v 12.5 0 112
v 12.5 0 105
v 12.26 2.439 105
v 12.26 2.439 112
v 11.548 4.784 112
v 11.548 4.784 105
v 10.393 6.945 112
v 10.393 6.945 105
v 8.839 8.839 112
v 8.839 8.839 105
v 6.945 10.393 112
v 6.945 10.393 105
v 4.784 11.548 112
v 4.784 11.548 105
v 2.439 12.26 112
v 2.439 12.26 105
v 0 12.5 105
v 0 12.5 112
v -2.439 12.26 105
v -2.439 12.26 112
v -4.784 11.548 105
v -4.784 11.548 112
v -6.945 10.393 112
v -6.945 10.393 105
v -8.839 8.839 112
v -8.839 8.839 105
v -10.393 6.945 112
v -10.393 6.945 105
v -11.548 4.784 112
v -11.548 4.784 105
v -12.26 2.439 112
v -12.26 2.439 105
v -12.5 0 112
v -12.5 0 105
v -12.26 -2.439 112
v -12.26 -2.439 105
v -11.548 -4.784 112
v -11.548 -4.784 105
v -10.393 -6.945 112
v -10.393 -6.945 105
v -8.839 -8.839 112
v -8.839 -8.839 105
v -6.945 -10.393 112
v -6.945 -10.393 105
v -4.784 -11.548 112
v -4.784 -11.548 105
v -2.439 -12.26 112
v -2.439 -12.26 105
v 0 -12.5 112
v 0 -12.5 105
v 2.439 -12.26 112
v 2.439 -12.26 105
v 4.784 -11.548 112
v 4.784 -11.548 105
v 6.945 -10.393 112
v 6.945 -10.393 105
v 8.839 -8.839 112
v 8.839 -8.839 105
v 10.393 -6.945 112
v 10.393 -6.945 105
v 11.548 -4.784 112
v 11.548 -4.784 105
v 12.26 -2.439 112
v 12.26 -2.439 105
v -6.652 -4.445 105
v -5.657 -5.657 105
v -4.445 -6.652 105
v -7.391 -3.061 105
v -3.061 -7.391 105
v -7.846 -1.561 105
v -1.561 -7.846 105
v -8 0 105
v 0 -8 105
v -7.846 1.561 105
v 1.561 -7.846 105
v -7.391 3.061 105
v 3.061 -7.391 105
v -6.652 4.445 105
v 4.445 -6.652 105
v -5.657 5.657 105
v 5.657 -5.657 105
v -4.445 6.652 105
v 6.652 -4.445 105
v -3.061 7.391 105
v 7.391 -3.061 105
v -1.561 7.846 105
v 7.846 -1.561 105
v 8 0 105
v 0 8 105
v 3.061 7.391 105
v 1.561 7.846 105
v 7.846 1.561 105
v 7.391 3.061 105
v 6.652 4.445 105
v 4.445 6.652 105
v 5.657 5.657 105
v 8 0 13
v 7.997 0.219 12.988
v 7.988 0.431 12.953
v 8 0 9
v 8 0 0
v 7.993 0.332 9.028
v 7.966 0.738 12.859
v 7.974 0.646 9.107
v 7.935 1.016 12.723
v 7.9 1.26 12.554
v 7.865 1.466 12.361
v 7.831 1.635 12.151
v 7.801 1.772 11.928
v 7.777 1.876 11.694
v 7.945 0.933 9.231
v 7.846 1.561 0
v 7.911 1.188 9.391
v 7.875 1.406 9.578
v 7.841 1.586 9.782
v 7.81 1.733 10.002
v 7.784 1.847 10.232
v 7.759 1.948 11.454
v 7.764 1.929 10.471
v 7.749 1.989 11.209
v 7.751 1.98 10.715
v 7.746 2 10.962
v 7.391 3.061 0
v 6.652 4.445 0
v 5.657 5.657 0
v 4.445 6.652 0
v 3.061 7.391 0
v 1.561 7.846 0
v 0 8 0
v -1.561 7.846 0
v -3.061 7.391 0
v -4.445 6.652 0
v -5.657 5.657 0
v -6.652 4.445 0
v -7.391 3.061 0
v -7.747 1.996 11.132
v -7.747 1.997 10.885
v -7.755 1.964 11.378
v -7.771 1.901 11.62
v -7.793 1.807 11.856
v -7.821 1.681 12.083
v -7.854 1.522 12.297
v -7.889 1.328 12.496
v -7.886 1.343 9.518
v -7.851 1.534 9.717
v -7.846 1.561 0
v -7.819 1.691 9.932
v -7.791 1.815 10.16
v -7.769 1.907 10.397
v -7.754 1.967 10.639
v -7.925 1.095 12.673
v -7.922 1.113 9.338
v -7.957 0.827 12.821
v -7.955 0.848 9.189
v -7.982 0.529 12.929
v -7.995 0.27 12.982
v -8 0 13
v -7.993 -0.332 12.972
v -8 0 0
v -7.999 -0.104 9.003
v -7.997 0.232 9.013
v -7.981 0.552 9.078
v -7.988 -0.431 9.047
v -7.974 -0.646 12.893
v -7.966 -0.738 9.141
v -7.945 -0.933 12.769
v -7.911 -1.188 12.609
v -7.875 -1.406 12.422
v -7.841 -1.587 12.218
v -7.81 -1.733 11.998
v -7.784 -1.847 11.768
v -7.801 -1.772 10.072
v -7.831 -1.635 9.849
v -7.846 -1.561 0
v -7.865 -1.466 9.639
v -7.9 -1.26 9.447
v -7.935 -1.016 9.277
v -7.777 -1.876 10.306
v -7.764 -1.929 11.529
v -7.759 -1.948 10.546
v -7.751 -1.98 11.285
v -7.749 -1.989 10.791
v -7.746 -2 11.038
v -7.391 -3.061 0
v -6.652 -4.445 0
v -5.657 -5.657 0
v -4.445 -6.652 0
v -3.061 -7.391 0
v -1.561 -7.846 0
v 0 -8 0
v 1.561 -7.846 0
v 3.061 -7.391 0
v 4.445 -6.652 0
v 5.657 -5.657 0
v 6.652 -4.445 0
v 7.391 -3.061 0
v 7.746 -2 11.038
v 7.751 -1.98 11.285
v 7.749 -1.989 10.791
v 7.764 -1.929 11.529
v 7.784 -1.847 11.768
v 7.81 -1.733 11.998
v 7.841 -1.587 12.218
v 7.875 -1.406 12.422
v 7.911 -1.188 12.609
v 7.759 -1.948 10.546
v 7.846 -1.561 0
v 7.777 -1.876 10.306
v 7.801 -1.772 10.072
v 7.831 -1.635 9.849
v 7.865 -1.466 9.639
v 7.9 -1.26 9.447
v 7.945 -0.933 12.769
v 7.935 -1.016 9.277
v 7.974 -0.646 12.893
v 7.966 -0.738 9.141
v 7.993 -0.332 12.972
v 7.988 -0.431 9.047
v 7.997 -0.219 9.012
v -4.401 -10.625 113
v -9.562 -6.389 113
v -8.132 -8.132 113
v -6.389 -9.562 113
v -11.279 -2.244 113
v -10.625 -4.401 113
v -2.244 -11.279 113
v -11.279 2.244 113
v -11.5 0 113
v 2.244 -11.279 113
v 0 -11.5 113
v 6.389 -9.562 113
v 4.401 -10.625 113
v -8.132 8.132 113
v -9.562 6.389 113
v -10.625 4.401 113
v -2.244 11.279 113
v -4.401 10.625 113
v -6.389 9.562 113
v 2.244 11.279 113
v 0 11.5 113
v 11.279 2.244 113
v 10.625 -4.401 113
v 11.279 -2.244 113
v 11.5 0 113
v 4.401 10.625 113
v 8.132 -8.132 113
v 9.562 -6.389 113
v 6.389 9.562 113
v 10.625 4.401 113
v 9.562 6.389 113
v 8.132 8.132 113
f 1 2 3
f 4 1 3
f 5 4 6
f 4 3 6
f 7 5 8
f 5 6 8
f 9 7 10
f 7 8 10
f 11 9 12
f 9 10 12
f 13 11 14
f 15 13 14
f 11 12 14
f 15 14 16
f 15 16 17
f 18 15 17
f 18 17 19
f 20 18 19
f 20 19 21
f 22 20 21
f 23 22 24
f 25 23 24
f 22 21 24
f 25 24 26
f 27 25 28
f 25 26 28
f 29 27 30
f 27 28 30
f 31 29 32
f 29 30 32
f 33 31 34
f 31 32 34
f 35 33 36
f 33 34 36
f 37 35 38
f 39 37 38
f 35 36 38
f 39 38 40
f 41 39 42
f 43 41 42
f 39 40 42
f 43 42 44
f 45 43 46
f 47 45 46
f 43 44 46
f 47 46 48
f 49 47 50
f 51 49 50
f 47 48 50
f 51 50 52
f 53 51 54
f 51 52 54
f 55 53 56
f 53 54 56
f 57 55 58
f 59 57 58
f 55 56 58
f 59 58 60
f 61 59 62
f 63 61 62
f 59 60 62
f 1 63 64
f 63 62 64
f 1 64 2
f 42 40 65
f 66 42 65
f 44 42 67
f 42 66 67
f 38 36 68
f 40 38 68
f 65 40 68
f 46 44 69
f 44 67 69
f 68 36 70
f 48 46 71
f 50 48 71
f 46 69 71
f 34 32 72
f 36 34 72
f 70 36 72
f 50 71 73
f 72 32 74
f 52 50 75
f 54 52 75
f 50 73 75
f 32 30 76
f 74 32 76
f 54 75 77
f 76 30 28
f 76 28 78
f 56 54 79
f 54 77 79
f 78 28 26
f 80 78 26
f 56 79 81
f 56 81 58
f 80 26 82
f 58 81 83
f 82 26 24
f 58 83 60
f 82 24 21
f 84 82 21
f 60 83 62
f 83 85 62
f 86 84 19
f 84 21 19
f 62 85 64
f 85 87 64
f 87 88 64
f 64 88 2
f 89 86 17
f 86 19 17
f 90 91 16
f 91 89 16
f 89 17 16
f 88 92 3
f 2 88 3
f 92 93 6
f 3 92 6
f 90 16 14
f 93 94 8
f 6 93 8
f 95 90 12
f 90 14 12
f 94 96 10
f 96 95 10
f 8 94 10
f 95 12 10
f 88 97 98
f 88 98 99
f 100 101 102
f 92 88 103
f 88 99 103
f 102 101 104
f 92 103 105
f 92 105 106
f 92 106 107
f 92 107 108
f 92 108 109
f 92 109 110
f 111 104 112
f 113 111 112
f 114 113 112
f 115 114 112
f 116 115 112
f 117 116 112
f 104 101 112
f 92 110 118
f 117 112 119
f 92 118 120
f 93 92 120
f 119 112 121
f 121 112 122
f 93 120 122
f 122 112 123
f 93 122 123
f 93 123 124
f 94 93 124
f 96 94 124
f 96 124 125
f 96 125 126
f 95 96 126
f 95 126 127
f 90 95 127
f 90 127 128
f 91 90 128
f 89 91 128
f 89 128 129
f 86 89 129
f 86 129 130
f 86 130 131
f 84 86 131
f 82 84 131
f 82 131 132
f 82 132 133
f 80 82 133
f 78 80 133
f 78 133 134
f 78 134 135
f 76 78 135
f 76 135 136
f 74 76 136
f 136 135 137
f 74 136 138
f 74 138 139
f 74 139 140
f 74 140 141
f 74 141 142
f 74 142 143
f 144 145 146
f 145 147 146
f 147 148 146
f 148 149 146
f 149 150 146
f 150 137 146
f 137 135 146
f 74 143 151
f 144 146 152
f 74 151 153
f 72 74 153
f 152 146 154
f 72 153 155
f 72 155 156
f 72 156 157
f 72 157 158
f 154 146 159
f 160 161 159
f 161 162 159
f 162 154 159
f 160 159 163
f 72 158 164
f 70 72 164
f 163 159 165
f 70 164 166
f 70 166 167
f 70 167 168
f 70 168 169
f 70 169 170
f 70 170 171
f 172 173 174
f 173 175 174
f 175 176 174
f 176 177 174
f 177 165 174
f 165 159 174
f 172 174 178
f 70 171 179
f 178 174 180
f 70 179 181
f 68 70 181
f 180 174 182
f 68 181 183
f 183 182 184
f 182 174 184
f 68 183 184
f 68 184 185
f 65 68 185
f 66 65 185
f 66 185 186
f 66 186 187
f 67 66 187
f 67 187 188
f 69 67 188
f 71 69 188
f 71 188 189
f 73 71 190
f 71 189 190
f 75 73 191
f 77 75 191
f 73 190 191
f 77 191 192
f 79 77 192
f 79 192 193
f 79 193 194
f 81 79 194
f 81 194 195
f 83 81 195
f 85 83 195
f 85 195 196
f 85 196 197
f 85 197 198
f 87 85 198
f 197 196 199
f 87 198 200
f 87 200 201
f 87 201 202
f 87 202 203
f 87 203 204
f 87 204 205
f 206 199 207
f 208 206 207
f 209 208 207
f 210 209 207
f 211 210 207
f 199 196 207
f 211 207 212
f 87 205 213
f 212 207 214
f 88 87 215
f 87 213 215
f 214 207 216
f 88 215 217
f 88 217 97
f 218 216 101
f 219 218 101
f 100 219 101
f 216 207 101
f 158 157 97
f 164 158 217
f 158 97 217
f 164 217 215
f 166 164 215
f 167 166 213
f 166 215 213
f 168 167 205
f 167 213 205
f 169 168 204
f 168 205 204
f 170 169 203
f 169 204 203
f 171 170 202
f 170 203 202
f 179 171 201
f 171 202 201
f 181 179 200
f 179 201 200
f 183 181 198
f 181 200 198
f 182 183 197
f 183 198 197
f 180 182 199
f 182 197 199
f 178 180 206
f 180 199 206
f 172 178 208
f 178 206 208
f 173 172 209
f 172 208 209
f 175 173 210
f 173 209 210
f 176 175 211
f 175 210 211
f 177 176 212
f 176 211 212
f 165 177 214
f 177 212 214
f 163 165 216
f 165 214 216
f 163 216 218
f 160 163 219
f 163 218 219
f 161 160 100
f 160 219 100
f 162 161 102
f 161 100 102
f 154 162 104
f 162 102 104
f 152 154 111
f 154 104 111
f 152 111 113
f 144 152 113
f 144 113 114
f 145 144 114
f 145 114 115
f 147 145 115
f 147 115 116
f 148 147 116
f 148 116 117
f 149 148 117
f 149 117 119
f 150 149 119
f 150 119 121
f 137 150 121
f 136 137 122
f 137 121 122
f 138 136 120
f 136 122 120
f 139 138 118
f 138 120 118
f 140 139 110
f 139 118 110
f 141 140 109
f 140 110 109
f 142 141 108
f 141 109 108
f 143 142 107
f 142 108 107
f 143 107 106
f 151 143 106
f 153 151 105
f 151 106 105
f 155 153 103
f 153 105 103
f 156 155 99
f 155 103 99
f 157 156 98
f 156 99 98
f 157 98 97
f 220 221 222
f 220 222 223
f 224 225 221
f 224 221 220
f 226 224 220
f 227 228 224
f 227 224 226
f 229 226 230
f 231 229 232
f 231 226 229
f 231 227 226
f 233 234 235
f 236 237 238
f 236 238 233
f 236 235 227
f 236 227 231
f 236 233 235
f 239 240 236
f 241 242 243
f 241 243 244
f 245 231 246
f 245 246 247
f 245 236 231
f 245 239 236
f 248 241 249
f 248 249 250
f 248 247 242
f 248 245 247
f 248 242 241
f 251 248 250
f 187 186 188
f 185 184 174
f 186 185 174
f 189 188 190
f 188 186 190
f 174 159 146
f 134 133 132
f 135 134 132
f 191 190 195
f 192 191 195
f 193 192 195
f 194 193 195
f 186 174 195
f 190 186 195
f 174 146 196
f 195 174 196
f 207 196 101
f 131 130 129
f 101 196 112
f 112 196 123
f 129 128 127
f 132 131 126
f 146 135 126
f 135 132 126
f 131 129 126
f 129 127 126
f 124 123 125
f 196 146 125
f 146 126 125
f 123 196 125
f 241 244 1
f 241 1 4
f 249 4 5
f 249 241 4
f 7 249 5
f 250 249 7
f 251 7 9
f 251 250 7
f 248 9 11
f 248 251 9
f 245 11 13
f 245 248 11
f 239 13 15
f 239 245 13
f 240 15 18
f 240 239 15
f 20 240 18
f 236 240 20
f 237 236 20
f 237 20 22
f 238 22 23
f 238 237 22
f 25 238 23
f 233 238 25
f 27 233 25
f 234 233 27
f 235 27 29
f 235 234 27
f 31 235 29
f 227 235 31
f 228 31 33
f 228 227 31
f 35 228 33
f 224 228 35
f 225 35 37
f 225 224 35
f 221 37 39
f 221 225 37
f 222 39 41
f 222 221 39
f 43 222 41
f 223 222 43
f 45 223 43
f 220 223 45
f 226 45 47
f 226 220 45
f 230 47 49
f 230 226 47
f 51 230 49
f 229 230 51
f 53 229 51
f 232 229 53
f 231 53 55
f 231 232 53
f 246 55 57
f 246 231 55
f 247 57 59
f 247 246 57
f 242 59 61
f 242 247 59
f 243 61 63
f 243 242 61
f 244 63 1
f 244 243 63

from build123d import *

# Parameters (mm, degrees)
SKETCH1_R           = 8
BOSS_EXTRUDE1_DEPTH = 105
SKETCH2_R           = 12.5
BOSS_EXTRUDE2_DEPTH = 8
CHAMFER1_SIZE       = 1
SKETCH3_R           = 2
CUT_EXTRUDE1_DEPTH  = 500


with BuildPart() as part:
    # Sketch1 → Boss-Extrude1 (new body)
    with BuildSketch(Plane.XY):
        Circle(SKETCH1_R)
    extrude(amount=BOSS_EXTRUDE1_DEPTH)

    # Sketch2 → Boss-Extrude2 (add)
    with BuildSketch(Plane.XY.offset(105)):
        Circle(SKETCH2_R)
    extrude(amount=BOSS_EXTRUDE2_DEPTH)

    # Chamfer1
    chamfer1_edges = [part.edges().sort_by_distance(p)[0] for p in [
        (-12.5, 0, 113),
    ]]
    chamfer(chamfer1_edges, length=CHAMFER1_SIZE)

    # Sketch3 → Cut-Extrude1 (cut, symmetric)
    with BuildSketch(Plane(origin=(0, 0, 0), x_dir=(0, 0, -1), z_dir=(1, 0, 0))):
        with Locations(Location((-11, 0, 0), (0, 0, 180))):
            Circle(SKETCH3_R)
    extrude(amount=CUT_EXTRUDE1_DEPTH, both=True, mode=Mode.SUBTRACT)


solid = part.part
